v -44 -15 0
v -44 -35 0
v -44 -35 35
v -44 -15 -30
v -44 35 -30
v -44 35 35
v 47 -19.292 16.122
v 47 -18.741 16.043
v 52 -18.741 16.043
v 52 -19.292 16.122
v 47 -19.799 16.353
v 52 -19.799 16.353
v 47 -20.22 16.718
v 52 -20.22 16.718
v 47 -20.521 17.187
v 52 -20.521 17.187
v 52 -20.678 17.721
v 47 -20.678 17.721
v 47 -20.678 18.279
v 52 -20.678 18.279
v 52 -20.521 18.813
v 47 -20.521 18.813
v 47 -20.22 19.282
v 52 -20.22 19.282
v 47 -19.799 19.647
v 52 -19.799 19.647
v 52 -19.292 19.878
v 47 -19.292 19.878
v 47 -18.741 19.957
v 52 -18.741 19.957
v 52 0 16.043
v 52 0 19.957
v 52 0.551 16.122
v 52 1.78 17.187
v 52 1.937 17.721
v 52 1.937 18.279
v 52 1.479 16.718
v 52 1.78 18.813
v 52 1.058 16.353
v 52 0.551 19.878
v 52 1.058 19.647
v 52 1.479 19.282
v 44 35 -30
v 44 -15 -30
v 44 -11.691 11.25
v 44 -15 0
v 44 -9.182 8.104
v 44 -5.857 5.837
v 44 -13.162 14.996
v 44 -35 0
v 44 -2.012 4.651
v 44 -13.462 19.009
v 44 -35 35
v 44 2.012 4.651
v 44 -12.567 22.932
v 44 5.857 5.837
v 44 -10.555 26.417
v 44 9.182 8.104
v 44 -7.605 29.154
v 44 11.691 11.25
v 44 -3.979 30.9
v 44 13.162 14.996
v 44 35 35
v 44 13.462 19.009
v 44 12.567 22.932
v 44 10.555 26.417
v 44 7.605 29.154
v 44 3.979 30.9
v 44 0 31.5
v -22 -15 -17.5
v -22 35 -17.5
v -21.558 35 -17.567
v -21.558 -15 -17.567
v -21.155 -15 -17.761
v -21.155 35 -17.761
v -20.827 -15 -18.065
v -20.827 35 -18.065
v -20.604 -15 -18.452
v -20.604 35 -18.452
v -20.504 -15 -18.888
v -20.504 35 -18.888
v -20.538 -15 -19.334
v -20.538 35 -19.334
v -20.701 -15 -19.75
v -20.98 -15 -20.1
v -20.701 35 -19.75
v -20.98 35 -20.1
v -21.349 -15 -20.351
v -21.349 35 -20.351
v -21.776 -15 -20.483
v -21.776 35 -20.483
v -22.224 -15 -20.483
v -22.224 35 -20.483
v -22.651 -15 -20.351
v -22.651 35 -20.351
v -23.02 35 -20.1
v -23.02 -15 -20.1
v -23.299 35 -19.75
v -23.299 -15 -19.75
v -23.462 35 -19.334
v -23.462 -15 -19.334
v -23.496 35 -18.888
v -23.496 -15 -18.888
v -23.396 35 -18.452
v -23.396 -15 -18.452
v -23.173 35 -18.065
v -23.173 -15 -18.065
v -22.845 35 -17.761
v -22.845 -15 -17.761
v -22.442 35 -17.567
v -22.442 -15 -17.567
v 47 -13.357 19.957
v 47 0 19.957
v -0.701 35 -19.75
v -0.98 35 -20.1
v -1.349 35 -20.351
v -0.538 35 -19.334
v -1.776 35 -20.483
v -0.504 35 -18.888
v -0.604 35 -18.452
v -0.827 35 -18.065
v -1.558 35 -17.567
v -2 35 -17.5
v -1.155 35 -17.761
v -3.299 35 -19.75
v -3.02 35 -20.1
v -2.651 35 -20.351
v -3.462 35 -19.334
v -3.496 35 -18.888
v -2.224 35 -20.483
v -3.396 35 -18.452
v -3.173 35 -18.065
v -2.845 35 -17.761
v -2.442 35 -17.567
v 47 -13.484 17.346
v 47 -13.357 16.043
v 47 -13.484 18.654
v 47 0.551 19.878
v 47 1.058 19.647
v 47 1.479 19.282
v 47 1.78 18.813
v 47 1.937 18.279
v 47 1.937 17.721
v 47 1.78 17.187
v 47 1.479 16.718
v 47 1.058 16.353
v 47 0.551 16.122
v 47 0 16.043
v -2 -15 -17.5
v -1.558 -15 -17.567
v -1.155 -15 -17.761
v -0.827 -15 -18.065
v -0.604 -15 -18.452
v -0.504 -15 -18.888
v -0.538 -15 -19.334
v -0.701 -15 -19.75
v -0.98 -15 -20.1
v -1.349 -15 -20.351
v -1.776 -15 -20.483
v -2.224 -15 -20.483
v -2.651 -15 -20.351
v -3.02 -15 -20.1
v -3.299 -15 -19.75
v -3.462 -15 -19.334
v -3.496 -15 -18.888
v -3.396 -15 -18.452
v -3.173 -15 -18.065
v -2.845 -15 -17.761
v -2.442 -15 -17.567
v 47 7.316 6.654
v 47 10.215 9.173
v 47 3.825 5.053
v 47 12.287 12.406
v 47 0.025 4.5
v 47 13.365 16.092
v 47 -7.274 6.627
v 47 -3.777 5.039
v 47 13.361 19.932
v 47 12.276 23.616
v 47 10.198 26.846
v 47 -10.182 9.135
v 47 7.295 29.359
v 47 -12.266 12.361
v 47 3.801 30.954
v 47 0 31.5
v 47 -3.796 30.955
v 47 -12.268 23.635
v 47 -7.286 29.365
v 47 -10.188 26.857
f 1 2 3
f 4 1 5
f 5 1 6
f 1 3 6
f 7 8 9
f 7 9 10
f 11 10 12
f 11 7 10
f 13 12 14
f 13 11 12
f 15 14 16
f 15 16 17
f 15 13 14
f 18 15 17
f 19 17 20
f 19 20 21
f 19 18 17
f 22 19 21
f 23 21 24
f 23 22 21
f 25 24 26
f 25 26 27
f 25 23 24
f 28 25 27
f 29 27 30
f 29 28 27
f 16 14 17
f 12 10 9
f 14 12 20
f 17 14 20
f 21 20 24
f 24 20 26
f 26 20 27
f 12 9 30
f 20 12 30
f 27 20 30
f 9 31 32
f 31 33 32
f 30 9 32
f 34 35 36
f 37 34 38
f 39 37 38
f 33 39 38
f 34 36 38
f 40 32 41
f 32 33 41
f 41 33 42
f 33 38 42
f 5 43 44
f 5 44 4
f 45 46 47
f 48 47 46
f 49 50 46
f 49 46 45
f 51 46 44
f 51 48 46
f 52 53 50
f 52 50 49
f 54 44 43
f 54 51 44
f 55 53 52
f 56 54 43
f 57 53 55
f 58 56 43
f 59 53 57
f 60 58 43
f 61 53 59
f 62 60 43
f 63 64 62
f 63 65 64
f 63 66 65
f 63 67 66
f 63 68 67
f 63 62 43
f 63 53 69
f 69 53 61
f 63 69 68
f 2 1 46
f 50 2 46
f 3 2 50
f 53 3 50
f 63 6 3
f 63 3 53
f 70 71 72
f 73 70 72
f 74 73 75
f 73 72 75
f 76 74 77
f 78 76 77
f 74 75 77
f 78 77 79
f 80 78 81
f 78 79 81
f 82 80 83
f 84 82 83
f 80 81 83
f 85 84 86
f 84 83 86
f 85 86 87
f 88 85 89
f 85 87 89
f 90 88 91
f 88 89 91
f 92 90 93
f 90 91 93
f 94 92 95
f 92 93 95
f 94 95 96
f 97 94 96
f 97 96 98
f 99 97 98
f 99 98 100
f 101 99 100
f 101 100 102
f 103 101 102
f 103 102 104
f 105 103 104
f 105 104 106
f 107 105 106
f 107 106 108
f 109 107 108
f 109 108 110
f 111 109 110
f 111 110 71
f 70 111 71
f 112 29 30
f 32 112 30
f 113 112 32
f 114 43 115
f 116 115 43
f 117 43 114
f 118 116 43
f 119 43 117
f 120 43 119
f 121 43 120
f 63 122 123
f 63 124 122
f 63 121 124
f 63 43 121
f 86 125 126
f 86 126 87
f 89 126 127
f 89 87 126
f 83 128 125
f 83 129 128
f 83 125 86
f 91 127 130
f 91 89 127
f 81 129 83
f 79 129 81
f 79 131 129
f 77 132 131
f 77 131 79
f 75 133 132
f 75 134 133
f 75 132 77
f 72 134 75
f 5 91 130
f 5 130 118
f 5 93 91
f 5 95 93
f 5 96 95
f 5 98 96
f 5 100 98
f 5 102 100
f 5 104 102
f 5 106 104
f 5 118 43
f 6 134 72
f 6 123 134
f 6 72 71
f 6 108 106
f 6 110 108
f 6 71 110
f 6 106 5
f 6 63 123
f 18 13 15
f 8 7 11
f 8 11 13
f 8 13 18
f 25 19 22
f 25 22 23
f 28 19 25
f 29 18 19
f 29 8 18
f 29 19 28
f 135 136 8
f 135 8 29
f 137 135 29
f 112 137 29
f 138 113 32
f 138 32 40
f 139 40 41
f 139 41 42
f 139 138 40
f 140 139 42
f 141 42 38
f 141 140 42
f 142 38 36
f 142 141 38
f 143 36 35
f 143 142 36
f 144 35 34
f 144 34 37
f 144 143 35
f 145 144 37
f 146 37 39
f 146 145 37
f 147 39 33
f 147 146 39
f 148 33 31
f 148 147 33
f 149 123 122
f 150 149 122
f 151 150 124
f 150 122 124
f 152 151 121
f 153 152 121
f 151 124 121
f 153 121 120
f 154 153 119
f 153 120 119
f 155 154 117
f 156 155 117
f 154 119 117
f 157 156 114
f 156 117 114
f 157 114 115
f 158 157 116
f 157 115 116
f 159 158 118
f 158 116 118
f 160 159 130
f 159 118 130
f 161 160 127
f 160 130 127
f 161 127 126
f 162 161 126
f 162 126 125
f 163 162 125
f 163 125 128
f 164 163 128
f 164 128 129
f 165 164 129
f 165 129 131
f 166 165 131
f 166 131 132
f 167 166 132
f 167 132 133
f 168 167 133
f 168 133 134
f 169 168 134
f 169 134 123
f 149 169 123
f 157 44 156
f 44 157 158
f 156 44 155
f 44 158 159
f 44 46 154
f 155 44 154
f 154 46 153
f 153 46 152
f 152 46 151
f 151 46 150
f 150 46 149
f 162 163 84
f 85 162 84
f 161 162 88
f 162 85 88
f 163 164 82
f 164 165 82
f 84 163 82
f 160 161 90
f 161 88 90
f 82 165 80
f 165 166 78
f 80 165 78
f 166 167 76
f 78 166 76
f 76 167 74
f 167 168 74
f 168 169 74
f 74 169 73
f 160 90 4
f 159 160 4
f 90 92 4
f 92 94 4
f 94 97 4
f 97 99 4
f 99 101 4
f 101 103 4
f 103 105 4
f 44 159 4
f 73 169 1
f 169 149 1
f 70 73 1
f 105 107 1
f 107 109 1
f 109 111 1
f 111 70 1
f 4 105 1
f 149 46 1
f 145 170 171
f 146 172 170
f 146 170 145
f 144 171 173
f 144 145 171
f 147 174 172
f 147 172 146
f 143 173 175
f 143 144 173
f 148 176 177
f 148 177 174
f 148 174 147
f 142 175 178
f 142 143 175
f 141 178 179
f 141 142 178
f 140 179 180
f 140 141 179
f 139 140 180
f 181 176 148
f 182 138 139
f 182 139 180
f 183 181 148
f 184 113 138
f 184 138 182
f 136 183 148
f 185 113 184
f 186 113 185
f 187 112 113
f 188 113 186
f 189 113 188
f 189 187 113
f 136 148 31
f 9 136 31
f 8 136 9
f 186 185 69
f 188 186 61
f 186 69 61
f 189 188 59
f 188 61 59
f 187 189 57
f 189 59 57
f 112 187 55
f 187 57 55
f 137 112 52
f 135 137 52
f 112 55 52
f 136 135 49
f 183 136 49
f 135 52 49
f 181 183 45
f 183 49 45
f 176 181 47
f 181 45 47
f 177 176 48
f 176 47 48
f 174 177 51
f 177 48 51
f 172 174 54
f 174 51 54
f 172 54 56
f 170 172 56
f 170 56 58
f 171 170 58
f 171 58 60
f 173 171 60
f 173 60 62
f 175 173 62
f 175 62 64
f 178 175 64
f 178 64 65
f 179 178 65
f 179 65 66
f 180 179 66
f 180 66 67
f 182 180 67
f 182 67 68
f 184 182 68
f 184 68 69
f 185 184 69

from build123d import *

# Parameters (mm, degrees)
SKETCH_1_W          = 88
SKETCH_1_H          = 70
EXTRUDE_1_DEPTH     = 35
SKETCH_3_W          = 88
SKETCH_3_H          = 50
EXTRUDE_2_DEPTH     = 30
SKETCH_6_R          = 13.5
EXTRUDE_3_DEPTH     = 3
EXTRUDE_4_DEPTH     = 5
CUT_EXTRUDE_1_REACH = 95.963
SKETCH_8_R          = 1.5


with BuildPart() as part:
    # 草图1 → 凸台-拉伸1 (new body)
    with BuildSketch(Plane.XY):
        Rectangle(SKETCH_1_W, SKETCH_1_H)
    extrude(amount=EXTRUDE_1_DEPTH)

    # 草图3 → 凸台-拉伸2 (add)
    with BuildSketch(Plane(origin=(0, 0, 0), x_dir=(-1, 0, 0), z_dir=(0, 0, -1))):
        with Locations((0, 10)):
            Rectangle(SKETCH_3_W, SKETCH_3_H)
    extrude(amount=EXTRUDE_2_DEPTH)

    # 草图6 → 凸台-拉伸3 (add)
    with BuildSketch(Plane(origin=(44, 0, 0), x_dir=(0, 0, -1), z_dir=(1, 0, 0))):
        with Locations(Location((-18, 0, 0), (0, 0, 180))):
            Circle(SKETCH_6_R)
    extrude(amount=EXTRUDE_3_DEPTH)

    # 草图7 → 凸台-拉伸4 (add)
    with BuildSketch(Plane(origin=(47, 0, 0), x_dir=(0, 0, -1), z_dir=(1, 0, 0))):
        with BuildLine():
            Line((-16.042793618, 0), (-16.042793618, -18.740555958))
            ThreePointArc((-16.042793618, -18.740555958), (-18, -20.697762339), (-19.957206382, -18.740555958))
            Line((-19.957206382, -18.740555958), (-19.957206382, 0))
            ThreePointArc((-19.957206382, 0), (-18, 1.957206382), (-16.042793618, 0))
        make_face()
    extrude(amount=EXTRUDE_4_DEPTH)

    # 草图8 → 切除-拉伸1 (cut, up to next)
    with BuildSketch(Plane(origin=(0, 35, 0), x_dir=(1, 0, 0), z_dir=(0, 1, 0)), mode=Mode.PRIVATE) as cut_extrude_1_sk1:
        with Locations(Location((-22, 19, 0), (0, 0, 270))):
            Circle(SKETCH_8_R)
    cut_extrude_1_tool1 = extrude(cut_extrude_1_sk1.sketch, amount=-CUT_EXTRUDE_1_REACH, mode=Mode.PRIVATE) & part.part
    # 草图8 → 切除-拉伸1 (cut, up to next)
    with BuildSketch(Plane(origin=(0, 35, 0), x_dir=(1, 0, 0), z_dir=(0, 1, 0)), mode=Mode.PRIVATE) as cut_extrude_1_sk2:
        with Locations(Location((-2, 19, 0), (0, 0, 270))):
            Circle(SKETCH_8_R)
    cut_extrude_1_tool2 = extrude(cut_extrude_1_sk2.sketch, amount=-CUT_EXTRUDE_1_REACH, mode=Mode.PRIVATE) & part.part
    add(cut_extrude_1_tool1.solids().sort_by_distance((-22, 35, -19))[0], mode=Mode.SUBTRACT)
    add(cut_extrude_1_tool2.solids().sort_by_distance((-2, 35, -19))[0], mode=Mode.SUBTRACT)


solid = part.part
